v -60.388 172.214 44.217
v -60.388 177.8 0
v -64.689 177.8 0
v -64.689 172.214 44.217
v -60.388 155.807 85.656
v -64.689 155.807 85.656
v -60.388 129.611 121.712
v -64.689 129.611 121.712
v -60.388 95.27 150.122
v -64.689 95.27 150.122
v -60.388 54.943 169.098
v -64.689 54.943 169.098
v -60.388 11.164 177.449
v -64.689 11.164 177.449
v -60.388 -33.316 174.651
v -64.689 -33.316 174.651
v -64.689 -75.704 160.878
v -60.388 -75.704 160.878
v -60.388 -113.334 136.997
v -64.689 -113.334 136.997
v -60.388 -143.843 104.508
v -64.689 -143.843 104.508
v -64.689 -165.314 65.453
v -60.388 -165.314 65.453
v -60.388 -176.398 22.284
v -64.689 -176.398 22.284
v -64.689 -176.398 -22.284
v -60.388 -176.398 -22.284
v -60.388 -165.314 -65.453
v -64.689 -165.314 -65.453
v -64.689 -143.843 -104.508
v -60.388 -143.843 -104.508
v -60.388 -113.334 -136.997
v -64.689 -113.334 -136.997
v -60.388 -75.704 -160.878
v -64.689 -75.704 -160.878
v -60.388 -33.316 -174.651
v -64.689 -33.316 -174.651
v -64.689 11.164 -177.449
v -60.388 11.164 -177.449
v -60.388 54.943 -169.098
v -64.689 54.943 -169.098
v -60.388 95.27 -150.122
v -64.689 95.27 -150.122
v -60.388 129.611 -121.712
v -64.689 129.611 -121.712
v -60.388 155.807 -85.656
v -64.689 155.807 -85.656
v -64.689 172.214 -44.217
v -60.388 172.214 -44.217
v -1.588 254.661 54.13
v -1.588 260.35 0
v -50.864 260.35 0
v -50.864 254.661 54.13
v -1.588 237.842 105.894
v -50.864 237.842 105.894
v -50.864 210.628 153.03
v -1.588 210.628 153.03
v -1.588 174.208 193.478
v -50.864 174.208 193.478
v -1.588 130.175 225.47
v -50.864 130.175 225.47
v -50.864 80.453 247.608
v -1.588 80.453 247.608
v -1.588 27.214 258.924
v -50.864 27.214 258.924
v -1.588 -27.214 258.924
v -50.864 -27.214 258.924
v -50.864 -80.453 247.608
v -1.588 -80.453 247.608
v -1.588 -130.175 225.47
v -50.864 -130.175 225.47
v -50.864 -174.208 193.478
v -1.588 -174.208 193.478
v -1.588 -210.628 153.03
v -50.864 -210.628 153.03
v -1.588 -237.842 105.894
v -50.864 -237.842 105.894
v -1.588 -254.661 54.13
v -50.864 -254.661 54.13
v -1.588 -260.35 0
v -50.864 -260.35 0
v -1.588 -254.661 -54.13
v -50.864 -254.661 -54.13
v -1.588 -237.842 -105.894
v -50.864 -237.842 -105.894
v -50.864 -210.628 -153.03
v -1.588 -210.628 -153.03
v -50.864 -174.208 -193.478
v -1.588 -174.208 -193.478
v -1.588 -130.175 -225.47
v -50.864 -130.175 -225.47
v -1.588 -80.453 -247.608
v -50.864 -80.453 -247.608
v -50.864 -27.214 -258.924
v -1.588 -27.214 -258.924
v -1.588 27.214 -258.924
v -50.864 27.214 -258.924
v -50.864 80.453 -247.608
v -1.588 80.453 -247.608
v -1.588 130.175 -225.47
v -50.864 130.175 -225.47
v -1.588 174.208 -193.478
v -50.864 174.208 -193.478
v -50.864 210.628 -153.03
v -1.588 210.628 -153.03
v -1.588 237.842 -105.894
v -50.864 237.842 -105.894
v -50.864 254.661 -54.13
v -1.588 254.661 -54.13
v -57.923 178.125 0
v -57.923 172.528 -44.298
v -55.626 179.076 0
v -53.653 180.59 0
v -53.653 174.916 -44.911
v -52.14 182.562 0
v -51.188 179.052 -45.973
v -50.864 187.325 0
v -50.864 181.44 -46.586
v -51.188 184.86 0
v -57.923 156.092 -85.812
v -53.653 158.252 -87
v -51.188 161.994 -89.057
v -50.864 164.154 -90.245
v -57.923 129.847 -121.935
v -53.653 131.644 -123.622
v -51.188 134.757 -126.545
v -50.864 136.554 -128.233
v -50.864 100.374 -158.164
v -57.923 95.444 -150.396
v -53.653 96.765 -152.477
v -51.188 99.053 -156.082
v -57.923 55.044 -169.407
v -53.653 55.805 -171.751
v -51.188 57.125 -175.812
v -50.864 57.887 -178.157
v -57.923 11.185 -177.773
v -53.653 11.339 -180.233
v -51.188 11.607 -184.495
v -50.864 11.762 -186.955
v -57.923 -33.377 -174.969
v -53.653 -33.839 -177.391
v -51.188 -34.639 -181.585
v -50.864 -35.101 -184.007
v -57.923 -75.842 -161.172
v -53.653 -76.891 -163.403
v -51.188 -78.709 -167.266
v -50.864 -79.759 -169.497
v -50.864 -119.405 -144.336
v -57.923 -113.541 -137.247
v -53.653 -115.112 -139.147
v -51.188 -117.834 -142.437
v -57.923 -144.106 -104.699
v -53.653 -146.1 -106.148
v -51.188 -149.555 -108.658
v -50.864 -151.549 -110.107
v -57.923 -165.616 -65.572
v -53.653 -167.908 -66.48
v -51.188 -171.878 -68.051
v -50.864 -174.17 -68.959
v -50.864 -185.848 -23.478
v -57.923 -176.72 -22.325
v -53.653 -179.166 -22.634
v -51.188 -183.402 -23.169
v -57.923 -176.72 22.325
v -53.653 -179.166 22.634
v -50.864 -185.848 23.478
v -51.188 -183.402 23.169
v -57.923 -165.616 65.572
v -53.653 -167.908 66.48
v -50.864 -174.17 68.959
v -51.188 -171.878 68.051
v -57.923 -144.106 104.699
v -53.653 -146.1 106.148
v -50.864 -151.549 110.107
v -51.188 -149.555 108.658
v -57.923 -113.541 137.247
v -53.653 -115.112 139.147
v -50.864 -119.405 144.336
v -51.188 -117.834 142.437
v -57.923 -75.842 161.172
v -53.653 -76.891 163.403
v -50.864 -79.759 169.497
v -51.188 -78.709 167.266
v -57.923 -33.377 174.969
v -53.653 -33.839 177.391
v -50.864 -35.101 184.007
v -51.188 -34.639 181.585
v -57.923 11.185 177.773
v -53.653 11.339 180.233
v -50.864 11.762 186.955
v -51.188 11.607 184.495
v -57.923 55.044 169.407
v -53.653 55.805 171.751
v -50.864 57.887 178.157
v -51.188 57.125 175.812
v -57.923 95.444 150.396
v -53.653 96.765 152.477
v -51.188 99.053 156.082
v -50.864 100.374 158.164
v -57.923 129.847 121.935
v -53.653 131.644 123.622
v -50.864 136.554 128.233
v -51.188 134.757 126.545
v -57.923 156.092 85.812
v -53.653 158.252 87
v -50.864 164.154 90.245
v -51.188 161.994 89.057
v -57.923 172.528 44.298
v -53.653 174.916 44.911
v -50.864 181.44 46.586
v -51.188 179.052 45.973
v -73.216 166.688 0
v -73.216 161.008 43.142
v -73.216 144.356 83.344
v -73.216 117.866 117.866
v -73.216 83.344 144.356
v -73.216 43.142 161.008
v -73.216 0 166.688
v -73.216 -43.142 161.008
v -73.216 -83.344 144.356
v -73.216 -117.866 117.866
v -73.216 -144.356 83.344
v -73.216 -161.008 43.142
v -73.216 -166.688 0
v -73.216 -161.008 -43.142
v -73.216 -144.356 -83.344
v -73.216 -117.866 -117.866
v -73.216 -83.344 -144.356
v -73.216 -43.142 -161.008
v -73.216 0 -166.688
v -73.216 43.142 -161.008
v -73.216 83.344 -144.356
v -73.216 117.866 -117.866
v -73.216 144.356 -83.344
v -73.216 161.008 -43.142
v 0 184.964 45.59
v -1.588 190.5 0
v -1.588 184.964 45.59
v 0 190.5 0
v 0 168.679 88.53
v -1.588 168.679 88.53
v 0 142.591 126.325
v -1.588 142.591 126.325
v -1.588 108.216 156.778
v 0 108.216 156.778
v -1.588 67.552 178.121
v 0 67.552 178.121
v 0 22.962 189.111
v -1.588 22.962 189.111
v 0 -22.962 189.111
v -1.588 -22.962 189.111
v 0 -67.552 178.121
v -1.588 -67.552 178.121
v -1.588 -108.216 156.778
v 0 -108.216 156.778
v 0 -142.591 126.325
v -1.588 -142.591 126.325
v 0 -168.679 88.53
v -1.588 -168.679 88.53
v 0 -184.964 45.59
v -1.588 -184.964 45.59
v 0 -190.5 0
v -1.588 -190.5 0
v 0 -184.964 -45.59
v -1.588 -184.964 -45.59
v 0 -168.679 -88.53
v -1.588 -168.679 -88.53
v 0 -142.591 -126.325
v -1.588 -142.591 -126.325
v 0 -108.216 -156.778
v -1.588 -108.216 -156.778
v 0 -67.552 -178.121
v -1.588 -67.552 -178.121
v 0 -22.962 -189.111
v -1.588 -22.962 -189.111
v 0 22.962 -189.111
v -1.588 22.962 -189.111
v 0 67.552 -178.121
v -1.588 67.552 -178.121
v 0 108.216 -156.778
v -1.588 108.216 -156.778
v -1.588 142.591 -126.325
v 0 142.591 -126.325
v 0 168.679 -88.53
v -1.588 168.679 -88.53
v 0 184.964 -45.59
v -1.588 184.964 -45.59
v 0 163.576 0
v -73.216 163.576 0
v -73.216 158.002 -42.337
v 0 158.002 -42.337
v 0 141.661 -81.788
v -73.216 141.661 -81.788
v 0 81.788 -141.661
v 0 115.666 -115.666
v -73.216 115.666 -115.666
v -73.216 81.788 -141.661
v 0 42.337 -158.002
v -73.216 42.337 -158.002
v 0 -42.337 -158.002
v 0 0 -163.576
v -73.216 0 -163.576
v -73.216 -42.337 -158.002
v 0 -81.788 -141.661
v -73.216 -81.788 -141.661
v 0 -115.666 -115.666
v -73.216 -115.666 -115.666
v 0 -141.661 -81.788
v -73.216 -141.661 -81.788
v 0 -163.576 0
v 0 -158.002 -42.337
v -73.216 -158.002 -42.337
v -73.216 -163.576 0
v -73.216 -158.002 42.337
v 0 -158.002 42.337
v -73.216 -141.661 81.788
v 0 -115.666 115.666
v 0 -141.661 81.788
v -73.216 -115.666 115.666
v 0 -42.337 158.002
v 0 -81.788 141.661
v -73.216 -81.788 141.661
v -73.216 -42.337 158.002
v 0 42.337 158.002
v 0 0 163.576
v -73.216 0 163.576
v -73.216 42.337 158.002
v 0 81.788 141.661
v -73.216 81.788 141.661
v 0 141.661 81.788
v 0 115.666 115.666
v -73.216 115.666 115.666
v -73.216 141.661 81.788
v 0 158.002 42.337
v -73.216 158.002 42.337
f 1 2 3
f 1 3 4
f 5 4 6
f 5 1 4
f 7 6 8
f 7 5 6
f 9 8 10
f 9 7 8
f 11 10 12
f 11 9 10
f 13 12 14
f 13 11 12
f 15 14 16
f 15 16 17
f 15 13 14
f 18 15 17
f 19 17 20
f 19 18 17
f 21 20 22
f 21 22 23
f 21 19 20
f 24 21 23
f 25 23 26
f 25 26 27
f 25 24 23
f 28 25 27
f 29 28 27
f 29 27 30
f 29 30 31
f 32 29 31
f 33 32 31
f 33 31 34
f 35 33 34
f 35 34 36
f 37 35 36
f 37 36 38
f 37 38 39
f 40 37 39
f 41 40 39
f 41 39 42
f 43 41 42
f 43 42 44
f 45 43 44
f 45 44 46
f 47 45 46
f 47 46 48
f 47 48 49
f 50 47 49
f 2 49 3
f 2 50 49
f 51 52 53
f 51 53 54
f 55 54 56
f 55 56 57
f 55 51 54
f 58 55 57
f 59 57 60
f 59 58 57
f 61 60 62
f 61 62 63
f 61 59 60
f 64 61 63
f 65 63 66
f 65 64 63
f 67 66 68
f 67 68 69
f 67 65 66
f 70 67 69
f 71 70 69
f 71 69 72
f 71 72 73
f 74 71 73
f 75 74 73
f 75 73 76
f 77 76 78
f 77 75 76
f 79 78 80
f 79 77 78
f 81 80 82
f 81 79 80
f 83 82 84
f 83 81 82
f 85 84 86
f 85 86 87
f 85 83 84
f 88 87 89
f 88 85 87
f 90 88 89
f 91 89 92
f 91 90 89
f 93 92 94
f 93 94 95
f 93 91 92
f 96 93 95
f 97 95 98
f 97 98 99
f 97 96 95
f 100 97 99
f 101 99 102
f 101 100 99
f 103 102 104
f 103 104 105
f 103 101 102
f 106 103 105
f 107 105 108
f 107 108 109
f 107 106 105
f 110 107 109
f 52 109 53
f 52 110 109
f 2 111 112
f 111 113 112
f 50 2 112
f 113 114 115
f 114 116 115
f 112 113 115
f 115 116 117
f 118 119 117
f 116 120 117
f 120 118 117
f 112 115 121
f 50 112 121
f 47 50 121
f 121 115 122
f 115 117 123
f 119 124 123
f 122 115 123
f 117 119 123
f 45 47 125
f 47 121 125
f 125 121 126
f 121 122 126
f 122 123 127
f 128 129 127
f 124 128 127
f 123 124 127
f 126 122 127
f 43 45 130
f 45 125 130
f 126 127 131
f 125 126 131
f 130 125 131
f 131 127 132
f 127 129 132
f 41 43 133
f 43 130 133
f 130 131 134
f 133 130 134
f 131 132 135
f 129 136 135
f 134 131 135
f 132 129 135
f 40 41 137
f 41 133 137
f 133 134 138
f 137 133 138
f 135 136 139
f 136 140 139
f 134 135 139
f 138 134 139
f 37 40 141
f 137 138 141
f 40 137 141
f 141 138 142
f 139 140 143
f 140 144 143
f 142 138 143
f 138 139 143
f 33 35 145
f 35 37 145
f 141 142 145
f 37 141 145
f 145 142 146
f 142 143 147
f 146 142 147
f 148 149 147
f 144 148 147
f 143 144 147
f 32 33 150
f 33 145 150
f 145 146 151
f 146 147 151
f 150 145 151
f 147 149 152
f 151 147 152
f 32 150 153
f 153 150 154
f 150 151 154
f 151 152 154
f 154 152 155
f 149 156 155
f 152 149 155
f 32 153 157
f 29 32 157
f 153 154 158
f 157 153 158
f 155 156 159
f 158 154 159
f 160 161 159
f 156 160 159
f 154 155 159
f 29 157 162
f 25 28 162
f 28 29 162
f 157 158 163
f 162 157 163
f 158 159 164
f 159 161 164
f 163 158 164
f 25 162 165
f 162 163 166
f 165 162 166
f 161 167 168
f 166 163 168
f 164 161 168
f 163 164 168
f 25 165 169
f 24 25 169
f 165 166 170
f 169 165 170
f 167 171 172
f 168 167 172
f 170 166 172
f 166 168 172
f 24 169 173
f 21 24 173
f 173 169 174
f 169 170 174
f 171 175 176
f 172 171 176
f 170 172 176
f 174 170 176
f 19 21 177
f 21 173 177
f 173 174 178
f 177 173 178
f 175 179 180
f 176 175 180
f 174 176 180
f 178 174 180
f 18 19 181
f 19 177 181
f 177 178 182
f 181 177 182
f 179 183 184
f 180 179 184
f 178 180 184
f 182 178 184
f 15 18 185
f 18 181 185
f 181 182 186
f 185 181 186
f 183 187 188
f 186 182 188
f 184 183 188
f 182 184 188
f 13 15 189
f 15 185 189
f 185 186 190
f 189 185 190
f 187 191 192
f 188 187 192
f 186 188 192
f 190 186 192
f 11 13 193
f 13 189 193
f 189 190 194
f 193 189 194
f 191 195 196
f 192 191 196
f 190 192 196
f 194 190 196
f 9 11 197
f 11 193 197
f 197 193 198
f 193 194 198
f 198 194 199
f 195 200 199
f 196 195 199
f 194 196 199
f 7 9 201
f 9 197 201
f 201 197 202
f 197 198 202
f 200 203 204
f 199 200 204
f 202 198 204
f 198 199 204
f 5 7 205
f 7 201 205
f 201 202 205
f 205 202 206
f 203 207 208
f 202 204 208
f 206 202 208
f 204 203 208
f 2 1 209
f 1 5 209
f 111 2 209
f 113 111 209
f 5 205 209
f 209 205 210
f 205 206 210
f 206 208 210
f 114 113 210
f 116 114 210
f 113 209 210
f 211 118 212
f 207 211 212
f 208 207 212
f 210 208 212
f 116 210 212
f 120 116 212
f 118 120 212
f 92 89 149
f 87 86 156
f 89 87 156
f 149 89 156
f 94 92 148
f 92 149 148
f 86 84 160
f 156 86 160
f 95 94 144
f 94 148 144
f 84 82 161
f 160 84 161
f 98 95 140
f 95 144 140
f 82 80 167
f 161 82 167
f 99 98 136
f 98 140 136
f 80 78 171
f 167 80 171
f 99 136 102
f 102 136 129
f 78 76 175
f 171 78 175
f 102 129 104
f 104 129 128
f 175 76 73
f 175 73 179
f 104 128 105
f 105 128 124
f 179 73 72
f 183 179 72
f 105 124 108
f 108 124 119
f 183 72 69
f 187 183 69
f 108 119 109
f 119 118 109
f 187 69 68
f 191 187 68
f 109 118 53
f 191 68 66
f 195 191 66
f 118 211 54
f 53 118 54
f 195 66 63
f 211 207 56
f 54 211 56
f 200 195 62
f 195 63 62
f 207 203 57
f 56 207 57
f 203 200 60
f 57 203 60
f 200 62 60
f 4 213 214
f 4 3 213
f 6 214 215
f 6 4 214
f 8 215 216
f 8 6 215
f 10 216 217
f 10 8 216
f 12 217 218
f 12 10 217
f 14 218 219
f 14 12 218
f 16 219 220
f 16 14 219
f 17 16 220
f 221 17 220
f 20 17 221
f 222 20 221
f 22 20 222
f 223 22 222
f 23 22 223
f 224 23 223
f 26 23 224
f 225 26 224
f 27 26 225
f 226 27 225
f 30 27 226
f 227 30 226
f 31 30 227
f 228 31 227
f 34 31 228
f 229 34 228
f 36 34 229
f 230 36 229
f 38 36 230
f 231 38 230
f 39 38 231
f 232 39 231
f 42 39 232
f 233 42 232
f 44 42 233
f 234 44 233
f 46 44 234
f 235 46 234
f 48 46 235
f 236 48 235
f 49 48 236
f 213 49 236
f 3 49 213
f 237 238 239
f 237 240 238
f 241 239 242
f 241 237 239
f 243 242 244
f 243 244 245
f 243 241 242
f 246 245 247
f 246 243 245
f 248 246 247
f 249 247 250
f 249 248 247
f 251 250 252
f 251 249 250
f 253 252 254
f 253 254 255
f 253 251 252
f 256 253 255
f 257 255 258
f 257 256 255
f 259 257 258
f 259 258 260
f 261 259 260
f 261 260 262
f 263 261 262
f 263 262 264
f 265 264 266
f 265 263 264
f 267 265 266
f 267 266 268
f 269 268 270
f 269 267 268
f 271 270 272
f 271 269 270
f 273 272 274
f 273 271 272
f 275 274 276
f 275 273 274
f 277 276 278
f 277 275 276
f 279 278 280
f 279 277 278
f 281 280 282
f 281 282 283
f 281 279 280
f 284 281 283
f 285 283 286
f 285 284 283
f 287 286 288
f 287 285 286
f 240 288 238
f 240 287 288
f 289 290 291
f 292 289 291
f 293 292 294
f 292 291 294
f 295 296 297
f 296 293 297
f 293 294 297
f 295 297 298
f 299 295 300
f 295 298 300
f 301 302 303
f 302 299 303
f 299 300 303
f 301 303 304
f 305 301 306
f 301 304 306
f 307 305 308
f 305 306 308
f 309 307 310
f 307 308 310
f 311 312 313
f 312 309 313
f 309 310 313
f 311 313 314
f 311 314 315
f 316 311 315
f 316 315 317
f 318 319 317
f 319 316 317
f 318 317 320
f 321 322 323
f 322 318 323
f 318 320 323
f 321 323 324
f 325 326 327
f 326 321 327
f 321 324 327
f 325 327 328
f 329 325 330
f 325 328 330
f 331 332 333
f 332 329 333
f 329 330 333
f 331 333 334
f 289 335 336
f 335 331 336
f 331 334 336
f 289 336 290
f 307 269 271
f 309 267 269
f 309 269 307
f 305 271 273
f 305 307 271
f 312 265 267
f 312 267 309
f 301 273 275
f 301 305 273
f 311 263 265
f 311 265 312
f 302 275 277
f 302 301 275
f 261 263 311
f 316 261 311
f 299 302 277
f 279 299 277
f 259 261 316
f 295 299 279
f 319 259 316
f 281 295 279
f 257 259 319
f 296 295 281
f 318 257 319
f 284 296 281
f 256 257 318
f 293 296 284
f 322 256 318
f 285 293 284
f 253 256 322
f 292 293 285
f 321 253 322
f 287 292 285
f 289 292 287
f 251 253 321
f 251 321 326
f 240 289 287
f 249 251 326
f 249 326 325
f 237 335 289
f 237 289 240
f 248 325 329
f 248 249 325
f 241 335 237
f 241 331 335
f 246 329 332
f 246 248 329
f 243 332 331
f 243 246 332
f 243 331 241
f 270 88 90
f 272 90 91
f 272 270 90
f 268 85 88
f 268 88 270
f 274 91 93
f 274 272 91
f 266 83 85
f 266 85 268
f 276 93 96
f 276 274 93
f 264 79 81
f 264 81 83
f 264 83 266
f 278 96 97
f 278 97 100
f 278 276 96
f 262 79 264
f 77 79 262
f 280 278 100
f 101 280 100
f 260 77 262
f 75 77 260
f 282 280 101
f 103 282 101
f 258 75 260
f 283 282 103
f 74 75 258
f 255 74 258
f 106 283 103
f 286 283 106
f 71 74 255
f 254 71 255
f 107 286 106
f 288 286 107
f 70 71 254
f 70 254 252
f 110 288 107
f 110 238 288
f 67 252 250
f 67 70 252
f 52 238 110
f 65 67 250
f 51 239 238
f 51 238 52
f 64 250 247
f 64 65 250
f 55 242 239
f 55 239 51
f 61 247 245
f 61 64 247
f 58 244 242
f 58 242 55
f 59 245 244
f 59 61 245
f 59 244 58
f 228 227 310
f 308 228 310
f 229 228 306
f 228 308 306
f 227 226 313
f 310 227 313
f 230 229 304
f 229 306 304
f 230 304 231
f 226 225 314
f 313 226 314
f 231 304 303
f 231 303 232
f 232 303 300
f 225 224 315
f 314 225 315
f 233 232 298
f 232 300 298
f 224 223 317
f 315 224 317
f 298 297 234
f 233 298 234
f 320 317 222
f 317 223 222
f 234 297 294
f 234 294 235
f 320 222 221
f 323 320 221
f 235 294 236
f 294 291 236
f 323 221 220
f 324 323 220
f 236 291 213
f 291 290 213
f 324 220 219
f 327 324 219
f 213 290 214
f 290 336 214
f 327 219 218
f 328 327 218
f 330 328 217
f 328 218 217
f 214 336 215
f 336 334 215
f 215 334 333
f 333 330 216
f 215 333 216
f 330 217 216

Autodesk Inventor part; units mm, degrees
ref_plane "YZ Plane" through (0, 0, 0) normal (1, 0, 0) x (0, 1, 0)
ref_plane "XZ Plane" through (0, 0, 0) normal (0, 1, 0) x (-1, 0, 0)
ref_plane "XY Plane" through (0, 0, 0) normal (0, 0, 1) x (1, 0, 0)
sketch "Sketch1" plane through (0, 0, 0) normal (0, 0, 1) x (1, 0, 0)
  line L0 (0, 0) -> (0, 163.576)
  line L1 (0, 163.576) -> (-73.2155, 163.576)
  line L2 (-73.2155, 163.576) -> (-73.2155, 187.325)
  line L3 (-73.2155, 187.325) -> (-50.8635, 187.325)
  line L4 (-50.8635, 187.325) -> (-50.8635, 260.35)
  line L5 (0, 190.5) -> (0, 163.576)
  line L6 (-50.8635, 260.35) -> (-1.5875, 260.35)
  line L7 (-1.5875, 260.35) -> (-1.5875, 190.5)
  line L8 (-1.5875, 190.5) -> (0, 190.5)
  line L9 (-87.8586, 0) -> (14.6431, 0) projected
  dimension "d0" = 1.5875
  dimension "d2" = 49.276
  dimension "d3" = 260.35
  dimension "d4" = 190.5
  dimension "d5" = 163.576
  dimension "d6" = 187.325
  dimension "d7" = 71.628
  dimension "d8" = 90
revolve "Revolution1" add sketch "Sketch1" angle 360 about axis through (-10, 0, 0) along (1, 0, 0)
sketch "Sketch2" plane through (0, 0, 0) normal (0, 0, 1) x (1, 0, 0)
  line L0 (-73.2155, -187.325) -> (-73.2155, -163.576) projected
  line L1 (-73.2155, -163.576) -> (0, -163.576) projected
  line L2 (0, -163.576) -> (0, -190.5) projected
  line L3 (0, -190.5) -> (-1.5875, -190.5) projected
  line L4 (-1.5875, -190.5) -> (-1.5875, -260.35) projected
  line L5 (-1.5875, -260.35) -> (-50.8635, -260.35) projected
  line L6 (-50.8635, -260.35) -> (-50.8635, -187.325) projected
  line L7 (-50.8635, -187.325) -> (-73.2155, -187.325) projected
  line L8 (-73.2155, 163.576) -> (-73.2155, 187.325) projected
  line L9 (-73.2155, 187.325) -> (-50.8635, 187.325) projected
  line L10 (-50.8635, 187.325) -> (-50.8635, 260.35) projected
  line L11 (-50.8635, 260.35) -> (-1.5875, 260.35) projected
  line L12 (-1.5875, 260.35) -> (-1.5875, 190.5) projected
  line L13 (-1.5875, 190.5) -> (0, 190.5) projected
  line L14 (0, 190.5) -> (0, 163.576) projected
  line L15 (0, 163.576) -> (-73.2155, 163.576) projected
  line L16 (0, -190.5) -> (0, 190.5) projected
  line L17 (0, 165.1) -> (-25.4, 165.1)
  line L18 (-73.2155, 165.1) -> (-73.2155, 166.6875)
  line L19 (-73.2155, 166.6875) -> (-64.6886, 177.8)
  line L20 (-64.6886, 177.8) -> (-60.3885, 177.8)
  line L21 (-50.8635, 177.8) -> (-50.8635, 187.325) construction
  line L22 (0, 165.1) -> (-25.4, 165.1) construction
  line L23 (-25.4, 165.1) -> (-25.4, 160.3375)
  line L24 (-25.4, 160.3375) -> (0, 160.3375)
  line L25 (0, 160.3375) -> (0, 165.1)
  arc A0 (-60.3885, 177.8) -> (-50.8635, 187.325) centre (-60.3885, 187.325) ccw
  line L26 (-60.3885, 177.8) -> (-50.8635, 177.8) construction
  line L27 (-25.4, 165.1) -> (-73.2155, 165.1)
  line L28 (-50.8635, -260.35) -> (-50.8635, 260.35) projected
  line L29 (-50.8635, 187.325) -> (-50.8635, 260.35)
  line L30 (-50.8635, 260.35) -> (-1.5875, 260.35)
  line L31 (-1.5875, 190.5) -> (0, 190.5)
  line L32 (-87.8586, 0) -> (14.6431, 0) projected
  point P0 (0, 0)
  dimension "d10" = 1.5875
  dimension "d11" = 37.5
  dimension "d12" = 177.8
  dimension "d13" = 25.4
  dimension "d14" = 160.3375
  dimension "d15" = 165.1
  dimension "d16" = 22.225
revolve "Revolution2" cut sketch "Sketch2" angle 360 about axis through (-10, 0, 0) along (1, 0, 0) contours A0 L20 L19 L8 L9
properties part number "A1-19027-400-06 ALTERNATE TEST FLANGE"
